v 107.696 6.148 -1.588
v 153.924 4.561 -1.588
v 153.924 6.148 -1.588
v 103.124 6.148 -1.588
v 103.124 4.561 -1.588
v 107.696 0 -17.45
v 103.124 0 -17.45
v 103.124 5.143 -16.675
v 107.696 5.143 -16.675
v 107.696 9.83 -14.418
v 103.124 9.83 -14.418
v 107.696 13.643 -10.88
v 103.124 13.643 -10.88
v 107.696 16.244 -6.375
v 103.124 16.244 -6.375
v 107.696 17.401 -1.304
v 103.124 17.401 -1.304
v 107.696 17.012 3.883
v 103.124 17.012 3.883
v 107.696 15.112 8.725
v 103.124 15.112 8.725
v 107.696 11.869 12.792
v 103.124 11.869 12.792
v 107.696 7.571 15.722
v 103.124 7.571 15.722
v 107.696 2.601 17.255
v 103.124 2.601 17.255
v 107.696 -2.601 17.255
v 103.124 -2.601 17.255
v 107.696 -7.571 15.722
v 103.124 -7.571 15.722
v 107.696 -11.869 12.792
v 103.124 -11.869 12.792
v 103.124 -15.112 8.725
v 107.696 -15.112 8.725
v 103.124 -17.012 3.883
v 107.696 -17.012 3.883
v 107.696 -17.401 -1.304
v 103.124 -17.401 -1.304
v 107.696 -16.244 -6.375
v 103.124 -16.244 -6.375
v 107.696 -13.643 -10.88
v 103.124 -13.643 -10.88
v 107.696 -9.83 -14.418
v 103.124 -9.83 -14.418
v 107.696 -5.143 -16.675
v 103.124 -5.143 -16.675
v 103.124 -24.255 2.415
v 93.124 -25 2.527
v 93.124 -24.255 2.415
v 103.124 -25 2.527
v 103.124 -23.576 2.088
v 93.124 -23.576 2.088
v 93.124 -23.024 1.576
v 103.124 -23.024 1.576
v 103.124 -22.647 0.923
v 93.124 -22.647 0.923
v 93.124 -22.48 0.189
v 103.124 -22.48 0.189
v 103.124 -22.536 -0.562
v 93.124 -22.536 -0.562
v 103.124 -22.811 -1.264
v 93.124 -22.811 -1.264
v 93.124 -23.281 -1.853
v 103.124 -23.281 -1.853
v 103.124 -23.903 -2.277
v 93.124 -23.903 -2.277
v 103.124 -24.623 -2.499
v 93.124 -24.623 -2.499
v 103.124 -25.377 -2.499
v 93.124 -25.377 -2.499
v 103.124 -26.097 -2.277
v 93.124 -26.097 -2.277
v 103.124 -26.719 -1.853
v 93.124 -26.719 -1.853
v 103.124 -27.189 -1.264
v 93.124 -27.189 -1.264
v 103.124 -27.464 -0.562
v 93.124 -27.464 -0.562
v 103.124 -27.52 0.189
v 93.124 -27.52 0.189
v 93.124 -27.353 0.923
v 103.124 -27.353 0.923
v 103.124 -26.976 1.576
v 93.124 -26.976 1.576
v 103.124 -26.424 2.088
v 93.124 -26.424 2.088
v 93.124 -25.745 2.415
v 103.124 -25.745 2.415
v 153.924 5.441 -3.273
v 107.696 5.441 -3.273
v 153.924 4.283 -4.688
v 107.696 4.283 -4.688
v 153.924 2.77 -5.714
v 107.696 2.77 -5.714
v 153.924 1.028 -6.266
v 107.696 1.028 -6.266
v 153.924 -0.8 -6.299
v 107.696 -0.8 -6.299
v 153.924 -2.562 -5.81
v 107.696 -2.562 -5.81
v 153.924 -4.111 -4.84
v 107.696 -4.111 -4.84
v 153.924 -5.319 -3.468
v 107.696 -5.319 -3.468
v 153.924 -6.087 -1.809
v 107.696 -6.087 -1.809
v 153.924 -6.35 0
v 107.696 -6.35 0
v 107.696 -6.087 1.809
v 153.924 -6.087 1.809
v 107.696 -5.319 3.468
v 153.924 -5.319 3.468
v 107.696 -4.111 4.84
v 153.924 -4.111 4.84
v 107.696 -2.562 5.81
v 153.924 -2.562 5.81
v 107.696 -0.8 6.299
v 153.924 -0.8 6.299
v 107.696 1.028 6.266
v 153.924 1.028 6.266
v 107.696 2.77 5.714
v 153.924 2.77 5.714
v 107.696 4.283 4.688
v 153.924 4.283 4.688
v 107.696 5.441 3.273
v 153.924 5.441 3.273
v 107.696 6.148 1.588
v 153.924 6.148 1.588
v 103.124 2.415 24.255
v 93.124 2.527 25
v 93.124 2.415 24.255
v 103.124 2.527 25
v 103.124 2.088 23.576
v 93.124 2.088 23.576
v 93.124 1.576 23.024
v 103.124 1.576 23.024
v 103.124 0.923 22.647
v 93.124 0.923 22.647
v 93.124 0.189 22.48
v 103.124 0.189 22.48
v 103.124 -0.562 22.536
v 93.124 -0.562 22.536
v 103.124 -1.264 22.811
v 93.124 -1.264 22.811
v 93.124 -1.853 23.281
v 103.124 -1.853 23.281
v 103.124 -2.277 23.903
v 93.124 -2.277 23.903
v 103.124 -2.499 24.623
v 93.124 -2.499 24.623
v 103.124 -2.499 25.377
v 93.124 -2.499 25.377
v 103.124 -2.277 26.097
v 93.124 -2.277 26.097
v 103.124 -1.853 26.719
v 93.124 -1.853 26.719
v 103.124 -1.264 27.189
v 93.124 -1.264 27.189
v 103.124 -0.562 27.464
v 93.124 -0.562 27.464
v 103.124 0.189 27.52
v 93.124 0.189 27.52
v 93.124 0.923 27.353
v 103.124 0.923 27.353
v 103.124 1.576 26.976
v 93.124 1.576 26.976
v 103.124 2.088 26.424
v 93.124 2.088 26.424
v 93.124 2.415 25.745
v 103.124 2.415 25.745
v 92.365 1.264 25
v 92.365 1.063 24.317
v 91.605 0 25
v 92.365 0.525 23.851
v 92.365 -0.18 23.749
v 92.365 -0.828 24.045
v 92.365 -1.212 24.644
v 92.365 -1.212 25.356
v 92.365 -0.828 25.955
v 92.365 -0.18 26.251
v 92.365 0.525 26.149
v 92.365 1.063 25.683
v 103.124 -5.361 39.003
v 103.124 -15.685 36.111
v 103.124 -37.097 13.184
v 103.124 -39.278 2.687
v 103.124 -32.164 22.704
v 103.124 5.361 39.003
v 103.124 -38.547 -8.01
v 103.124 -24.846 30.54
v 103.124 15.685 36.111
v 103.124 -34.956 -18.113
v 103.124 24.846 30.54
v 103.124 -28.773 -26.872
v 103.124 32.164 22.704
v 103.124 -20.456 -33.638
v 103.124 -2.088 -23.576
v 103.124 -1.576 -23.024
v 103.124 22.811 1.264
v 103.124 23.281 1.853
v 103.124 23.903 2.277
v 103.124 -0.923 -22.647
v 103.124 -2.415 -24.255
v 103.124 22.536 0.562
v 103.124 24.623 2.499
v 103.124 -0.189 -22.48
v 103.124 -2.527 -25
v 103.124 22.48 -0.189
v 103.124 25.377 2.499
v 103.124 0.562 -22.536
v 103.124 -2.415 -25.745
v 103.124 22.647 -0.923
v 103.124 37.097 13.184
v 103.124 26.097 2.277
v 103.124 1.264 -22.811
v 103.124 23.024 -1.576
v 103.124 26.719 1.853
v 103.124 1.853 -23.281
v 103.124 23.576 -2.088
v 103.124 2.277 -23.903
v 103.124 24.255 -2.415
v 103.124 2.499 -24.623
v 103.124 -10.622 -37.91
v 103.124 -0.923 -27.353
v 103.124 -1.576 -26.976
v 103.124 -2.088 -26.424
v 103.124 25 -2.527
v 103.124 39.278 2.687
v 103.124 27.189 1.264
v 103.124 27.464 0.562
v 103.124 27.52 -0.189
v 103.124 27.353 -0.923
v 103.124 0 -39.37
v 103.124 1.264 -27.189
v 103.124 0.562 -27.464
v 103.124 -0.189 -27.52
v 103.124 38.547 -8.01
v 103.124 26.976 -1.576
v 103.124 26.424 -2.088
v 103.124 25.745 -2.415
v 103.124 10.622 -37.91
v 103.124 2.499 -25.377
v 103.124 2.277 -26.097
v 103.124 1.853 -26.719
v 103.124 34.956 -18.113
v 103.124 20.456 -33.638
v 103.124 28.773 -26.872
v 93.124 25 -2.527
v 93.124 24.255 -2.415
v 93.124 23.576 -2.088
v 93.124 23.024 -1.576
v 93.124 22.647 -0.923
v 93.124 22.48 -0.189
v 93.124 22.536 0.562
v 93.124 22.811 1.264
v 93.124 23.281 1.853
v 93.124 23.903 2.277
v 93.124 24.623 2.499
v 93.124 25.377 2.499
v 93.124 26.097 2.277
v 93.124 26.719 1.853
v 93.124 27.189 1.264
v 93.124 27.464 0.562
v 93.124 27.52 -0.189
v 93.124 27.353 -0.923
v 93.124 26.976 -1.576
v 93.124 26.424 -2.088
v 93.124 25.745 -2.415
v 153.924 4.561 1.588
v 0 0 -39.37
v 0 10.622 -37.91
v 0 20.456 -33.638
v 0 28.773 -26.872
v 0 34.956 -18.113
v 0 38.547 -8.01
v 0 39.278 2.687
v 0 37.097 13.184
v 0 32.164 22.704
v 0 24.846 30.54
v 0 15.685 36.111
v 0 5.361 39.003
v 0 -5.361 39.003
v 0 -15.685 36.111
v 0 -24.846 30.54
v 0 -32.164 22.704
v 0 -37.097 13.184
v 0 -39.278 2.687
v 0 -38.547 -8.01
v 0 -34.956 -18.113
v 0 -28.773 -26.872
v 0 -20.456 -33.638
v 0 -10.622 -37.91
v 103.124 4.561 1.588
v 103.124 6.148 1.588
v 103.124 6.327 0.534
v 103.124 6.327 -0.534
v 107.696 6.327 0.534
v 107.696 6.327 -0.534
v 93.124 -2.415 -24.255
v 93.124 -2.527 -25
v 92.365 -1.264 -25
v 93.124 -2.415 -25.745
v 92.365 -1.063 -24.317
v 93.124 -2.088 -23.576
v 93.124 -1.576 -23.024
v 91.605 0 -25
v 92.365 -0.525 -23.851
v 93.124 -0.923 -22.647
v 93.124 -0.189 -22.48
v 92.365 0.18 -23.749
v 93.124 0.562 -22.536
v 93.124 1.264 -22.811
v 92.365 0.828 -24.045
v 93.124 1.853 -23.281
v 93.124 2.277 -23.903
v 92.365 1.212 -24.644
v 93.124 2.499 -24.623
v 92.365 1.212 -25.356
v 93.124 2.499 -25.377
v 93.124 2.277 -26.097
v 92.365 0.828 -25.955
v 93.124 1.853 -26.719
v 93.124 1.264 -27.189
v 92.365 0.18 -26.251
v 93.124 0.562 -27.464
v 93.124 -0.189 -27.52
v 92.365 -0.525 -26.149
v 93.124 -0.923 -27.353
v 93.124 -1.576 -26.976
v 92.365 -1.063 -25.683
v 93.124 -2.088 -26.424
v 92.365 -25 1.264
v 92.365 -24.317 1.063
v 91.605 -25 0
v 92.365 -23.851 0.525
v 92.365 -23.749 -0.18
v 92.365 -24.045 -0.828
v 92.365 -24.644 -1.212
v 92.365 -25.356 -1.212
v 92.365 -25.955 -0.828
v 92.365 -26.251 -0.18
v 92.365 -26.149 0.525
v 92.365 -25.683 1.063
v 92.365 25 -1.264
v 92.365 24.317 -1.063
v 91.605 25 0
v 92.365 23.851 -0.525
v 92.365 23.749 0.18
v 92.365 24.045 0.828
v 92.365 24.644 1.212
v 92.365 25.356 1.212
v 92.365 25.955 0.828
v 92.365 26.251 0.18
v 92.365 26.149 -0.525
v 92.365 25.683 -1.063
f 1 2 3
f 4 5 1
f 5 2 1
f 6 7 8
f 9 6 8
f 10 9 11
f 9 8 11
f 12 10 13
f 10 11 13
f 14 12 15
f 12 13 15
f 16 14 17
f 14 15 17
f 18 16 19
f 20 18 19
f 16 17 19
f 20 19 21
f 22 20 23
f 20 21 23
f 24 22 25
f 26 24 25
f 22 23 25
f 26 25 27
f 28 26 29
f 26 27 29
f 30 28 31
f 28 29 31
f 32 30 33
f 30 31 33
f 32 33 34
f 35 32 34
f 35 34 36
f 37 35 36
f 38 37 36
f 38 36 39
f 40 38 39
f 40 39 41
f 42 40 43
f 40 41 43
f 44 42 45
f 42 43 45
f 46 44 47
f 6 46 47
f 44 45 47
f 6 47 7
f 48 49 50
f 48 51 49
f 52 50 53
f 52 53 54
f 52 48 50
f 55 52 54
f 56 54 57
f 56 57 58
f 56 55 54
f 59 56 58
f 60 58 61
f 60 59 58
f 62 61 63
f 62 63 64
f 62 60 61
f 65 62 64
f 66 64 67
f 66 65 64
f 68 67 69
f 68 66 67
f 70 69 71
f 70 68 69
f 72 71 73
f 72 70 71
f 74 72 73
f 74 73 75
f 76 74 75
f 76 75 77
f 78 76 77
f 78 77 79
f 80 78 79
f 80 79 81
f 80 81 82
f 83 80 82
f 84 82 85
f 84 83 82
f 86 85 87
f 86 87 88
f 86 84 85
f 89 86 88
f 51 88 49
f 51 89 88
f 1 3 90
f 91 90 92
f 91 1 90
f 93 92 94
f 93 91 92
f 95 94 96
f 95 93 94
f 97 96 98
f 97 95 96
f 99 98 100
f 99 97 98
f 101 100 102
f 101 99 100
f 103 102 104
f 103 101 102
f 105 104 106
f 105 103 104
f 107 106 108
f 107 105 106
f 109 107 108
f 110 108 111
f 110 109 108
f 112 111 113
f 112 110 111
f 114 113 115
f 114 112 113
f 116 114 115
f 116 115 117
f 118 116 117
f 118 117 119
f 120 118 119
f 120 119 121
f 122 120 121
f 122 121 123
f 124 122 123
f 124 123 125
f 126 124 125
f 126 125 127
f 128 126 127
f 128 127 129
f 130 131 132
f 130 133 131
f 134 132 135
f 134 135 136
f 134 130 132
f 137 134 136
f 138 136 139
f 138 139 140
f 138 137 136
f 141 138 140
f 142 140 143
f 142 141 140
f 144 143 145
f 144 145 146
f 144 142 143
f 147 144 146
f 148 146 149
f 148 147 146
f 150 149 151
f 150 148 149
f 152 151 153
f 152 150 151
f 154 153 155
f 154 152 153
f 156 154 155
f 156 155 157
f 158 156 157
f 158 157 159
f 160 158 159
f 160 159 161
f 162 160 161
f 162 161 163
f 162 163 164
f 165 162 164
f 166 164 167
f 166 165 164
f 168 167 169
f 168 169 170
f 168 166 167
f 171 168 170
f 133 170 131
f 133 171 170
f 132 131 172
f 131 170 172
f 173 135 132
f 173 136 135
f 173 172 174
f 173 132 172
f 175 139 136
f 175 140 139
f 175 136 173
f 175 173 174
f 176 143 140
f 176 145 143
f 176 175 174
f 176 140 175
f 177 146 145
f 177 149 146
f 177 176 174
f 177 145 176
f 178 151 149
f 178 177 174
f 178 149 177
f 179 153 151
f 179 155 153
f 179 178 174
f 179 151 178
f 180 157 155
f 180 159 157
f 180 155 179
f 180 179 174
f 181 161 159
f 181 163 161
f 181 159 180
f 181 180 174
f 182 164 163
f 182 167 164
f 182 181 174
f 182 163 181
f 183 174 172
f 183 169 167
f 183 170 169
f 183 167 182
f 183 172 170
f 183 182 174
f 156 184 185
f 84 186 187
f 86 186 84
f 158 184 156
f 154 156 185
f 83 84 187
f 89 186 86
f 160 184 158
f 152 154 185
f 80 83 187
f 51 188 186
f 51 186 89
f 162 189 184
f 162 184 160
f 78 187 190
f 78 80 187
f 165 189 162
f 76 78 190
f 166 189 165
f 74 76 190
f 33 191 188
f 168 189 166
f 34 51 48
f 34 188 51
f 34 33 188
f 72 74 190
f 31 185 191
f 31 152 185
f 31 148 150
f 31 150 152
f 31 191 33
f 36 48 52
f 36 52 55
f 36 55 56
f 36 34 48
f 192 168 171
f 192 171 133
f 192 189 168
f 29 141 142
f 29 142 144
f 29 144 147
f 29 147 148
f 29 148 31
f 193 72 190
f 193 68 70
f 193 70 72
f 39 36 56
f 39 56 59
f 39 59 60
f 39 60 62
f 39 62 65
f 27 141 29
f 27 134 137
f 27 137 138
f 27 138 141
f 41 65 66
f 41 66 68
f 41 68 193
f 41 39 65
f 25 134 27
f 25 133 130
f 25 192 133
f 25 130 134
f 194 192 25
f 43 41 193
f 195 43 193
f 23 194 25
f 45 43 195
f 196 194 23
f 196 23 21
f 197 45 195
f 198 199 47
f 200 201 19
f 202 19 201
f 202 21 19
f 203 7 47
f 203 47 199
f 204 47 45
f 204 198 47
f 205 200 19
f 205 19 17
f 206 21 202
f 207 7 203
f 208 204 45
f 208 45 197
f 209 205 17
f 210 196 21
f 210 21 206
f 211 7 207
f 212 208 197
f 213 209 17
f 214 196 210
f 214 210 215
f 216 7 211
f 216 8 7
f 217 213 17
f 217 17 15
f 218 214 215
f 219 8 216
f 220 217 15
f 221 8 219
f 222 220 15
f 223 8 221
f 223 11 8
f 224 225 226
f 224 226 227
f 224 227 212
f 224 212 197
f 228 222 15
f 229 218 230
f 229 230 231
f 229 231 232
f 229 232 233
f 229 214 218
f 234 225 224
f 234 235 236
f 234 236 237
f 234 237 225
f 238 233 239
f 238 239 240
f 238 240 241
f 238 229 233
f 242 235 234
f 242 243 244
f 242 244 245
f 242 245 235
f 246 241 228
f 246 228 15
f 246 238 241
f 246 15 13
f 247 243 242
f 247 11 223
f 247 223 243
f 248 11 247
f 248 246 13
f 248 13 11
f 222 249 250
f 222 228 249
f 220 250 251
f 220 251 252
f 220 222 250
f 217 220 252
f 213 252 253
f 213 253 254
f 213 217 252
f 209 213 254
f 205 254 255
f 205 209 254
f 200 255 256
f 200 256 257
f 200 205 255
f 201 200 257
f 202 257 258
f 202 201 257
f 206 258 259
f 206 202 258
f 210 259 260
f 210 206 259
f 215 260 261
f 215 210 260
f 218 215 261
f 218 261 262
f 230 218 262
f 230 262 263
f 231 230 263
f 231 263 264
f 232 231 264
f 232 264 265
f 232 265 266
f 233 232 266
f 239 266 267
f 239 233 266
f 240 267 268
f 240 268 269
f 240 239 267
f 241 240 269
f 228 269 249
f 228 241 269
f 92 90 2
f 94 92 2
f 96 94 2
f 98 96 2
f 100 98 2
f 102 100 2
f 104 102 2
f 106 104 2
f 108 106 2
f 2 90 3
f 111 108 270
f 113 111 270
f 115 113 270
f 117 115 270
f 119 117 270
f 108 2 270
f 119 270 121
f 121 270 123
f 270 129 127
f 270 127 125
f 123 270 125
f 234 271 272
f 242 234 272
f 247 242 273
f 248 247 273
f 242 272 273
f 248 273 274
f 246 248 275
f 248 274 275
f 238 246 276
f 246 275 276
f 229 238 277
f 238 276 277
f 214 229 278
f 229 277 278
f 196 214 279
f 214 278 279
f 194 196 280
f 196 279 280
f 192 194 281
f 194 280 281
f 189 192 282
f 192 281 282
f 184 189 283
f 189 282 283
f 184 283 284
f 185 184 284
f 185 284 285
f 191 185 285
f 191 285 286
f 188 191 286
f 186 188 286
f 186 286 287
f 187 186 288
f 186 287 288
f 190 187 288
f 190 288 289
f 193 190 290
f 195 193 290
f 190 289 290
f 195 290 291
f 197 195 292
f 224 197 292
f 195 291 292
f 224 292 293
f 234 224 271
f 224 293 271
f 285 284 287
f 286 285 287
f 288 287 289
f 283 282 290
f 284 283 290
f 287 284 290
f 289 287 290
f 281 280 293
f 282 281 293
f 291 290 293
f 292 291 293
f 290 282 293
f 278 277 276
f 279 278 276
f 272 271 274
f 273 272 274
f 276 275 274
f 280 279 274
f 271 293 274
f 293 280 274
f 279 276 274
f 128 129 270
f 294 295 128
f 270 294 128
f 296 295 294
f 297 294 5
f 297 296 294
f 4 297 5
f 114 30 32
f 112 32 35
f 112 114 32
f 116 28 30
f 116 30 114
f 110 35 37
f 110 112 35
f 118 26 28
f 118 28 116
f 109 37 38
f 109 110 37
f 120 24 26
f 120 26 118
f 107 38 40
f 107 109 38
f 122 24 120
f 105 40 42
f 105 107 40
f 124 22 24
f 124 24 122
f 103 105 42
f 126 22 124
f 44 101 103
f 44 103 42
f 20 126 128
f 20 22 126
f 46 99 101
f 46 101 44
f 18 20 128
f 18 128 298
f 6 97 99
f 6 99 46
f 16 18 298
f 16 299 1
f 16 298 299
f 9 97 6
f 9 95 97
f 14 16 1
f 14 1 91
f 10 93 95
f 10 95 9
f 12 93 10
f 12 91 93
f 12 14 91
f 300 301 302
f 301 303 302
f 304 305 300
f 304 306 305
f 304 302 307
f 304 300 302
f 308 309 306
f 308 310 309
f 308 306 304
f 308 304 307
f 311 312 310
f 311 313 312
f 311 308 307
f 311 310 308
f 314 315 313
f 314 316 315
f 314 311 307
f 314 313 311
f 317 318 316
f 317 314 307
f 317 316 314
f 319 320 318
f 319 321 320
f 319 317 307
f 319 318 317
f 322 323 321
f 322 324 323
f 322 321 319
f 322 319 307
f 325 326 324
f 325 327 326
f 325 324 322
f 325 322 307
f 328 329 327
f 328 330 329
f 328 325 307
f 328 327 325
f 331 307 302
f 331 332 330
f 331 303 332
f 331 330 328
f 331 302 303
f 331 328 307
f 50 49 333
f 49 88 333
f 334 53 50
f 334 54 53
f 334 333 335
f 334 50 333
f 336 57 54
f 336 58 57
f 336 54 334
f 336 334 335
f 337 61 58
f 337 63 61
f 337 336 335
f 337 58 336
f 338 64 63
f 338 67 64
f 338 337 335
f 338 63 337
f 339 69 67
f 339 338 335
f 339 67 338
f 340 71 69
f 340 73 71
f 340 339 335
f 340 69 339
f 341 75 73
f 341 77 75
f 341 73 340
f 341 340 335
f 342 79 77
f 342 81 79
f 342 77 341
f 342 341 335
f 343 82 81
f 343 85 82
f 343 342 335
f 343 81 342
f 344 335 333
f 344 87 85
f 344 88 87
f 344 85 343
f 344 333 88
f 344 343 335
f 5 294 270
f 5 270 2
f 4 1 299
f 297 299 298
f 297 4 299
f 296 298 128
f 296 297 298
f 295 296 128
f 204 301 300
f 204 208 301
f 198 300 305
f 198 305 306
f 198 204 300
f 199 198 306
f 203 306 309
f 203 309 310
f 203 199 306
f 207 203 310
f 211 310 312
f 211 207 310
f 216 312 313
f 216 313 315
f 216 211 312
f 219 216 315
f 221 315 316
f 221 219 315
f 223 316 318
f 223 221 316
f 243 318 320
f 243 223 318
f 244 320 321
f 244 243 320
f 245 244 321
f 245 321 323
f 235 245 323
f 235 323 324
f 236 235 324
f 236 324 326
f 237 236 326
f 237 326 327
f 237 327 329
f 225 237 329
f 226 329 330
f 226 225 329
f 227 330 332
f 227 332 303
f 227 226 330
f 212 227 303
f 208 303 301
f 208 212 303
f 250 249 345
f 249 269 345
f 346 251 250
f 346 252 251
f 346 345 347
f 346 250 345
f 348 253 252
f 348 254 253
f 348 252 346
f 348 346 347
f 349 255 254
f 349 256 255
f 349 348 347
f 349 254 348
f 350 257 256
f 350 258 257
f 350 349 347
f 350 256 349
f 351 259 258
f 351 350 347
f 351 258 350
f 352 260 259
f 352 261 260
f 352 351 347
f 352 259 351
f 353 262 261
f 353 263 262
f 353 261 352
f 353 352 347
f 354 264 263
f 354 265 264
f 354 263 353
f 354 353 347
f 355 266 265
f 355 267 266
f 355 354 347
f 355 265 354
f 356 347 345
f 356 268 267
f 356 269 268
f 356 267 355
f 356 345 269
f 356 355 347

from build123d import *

# Parameters (mm, degrees)
SKETCH1_R           = 39.37
BOSS_EXTRUDE1_DEPTH = 103.124
BOSS_EXTRUDE2_DEPTH = 50.8
CIRPATTERN1_COUNT   = 4
SKETCH6_R           = 17.4498
SKETCH6_R_2         = 6.35
BOSS_EXTRUDE3_DEPTH = 4.572


with BuildPart() as part:
    # Sketch1 → Boss-Extrude1 (new body)
    with BuildSketch(Plane(origin=(0, 0, 0), x_dir=(0, 0, -1), z_dir=(1, 0, 0))):
        Circle(SKETCH1_R)
    extrude(amount=BOSS_EXTRUDE1_DEPTH)

    # Sketch2 → Boss-Extrude2 (add)
    with BuildSketch(Plane(origin=(103.124, 0, 0), x_dir=(0, 0, -1), z_dir=(1, 0, 0))):
        with BuildLine():
            Line((-1.5875, 6.148361062), (-1.5875, 4.560861062))
            Line((-1.5875, 4.560861062), (1.5875, 4.560861062))
            Line((1.5875, 4.560861062), (1.5875, 6.148361062))
            ThreePointArc((1.5875, 6.148361062), (0, -6.35), (-1.5875, 6.148361062))
        make_face()
    extrude(amount=BOSS_EXTRUDE2_DEPTH)

    # Sketch4 → #8 (0.199) Diameter Hole1 (revolve, cut)
    with BuildSketch(Plane(origin=(103.124, 25, 0), x_dir=(0, 0, -1), z_dir=(0, 1, 0))):
        Polygon((0, 0), (0, 11.518555042), (2.5273, 10), (2.5273, 0), align=None)
    f_8_0_199_diameter_hole1 = revolve(axis=Axis((109.474, 25, 0), (-1, 0, 0)), mode=Mode.SUBTRACT)

    # CirPattern1: #8 (0.199) Diameter Hole1 ×4 about axis
    cirpattern1_axis = Axis((0, 0, 0), (1, 0, 0))
    for i in range(1, CIRPATTERN1_COUNT):
        add(f_8_0_199_diameter_hole1.rotate(cirpattern1_axis, i * 360 / CIRPATTERN1_COUNT), mode=Mode.SUBTRACT)

    # Sketch6 → Boss-Extrude3 (add)
    with BuildSketch(Plane(origin=(103.124, 0, 0), x_dir=(0, 0, -1), z_dir=(1, 0, 0))):
        Circle(SKETCH6_R)
        Circle(SKETCH6_R_2, mode=Mode.SUBTRACT)
    extrude(amount=BOSS_EXTRUDE3_DEPTH)


solid = part.part
